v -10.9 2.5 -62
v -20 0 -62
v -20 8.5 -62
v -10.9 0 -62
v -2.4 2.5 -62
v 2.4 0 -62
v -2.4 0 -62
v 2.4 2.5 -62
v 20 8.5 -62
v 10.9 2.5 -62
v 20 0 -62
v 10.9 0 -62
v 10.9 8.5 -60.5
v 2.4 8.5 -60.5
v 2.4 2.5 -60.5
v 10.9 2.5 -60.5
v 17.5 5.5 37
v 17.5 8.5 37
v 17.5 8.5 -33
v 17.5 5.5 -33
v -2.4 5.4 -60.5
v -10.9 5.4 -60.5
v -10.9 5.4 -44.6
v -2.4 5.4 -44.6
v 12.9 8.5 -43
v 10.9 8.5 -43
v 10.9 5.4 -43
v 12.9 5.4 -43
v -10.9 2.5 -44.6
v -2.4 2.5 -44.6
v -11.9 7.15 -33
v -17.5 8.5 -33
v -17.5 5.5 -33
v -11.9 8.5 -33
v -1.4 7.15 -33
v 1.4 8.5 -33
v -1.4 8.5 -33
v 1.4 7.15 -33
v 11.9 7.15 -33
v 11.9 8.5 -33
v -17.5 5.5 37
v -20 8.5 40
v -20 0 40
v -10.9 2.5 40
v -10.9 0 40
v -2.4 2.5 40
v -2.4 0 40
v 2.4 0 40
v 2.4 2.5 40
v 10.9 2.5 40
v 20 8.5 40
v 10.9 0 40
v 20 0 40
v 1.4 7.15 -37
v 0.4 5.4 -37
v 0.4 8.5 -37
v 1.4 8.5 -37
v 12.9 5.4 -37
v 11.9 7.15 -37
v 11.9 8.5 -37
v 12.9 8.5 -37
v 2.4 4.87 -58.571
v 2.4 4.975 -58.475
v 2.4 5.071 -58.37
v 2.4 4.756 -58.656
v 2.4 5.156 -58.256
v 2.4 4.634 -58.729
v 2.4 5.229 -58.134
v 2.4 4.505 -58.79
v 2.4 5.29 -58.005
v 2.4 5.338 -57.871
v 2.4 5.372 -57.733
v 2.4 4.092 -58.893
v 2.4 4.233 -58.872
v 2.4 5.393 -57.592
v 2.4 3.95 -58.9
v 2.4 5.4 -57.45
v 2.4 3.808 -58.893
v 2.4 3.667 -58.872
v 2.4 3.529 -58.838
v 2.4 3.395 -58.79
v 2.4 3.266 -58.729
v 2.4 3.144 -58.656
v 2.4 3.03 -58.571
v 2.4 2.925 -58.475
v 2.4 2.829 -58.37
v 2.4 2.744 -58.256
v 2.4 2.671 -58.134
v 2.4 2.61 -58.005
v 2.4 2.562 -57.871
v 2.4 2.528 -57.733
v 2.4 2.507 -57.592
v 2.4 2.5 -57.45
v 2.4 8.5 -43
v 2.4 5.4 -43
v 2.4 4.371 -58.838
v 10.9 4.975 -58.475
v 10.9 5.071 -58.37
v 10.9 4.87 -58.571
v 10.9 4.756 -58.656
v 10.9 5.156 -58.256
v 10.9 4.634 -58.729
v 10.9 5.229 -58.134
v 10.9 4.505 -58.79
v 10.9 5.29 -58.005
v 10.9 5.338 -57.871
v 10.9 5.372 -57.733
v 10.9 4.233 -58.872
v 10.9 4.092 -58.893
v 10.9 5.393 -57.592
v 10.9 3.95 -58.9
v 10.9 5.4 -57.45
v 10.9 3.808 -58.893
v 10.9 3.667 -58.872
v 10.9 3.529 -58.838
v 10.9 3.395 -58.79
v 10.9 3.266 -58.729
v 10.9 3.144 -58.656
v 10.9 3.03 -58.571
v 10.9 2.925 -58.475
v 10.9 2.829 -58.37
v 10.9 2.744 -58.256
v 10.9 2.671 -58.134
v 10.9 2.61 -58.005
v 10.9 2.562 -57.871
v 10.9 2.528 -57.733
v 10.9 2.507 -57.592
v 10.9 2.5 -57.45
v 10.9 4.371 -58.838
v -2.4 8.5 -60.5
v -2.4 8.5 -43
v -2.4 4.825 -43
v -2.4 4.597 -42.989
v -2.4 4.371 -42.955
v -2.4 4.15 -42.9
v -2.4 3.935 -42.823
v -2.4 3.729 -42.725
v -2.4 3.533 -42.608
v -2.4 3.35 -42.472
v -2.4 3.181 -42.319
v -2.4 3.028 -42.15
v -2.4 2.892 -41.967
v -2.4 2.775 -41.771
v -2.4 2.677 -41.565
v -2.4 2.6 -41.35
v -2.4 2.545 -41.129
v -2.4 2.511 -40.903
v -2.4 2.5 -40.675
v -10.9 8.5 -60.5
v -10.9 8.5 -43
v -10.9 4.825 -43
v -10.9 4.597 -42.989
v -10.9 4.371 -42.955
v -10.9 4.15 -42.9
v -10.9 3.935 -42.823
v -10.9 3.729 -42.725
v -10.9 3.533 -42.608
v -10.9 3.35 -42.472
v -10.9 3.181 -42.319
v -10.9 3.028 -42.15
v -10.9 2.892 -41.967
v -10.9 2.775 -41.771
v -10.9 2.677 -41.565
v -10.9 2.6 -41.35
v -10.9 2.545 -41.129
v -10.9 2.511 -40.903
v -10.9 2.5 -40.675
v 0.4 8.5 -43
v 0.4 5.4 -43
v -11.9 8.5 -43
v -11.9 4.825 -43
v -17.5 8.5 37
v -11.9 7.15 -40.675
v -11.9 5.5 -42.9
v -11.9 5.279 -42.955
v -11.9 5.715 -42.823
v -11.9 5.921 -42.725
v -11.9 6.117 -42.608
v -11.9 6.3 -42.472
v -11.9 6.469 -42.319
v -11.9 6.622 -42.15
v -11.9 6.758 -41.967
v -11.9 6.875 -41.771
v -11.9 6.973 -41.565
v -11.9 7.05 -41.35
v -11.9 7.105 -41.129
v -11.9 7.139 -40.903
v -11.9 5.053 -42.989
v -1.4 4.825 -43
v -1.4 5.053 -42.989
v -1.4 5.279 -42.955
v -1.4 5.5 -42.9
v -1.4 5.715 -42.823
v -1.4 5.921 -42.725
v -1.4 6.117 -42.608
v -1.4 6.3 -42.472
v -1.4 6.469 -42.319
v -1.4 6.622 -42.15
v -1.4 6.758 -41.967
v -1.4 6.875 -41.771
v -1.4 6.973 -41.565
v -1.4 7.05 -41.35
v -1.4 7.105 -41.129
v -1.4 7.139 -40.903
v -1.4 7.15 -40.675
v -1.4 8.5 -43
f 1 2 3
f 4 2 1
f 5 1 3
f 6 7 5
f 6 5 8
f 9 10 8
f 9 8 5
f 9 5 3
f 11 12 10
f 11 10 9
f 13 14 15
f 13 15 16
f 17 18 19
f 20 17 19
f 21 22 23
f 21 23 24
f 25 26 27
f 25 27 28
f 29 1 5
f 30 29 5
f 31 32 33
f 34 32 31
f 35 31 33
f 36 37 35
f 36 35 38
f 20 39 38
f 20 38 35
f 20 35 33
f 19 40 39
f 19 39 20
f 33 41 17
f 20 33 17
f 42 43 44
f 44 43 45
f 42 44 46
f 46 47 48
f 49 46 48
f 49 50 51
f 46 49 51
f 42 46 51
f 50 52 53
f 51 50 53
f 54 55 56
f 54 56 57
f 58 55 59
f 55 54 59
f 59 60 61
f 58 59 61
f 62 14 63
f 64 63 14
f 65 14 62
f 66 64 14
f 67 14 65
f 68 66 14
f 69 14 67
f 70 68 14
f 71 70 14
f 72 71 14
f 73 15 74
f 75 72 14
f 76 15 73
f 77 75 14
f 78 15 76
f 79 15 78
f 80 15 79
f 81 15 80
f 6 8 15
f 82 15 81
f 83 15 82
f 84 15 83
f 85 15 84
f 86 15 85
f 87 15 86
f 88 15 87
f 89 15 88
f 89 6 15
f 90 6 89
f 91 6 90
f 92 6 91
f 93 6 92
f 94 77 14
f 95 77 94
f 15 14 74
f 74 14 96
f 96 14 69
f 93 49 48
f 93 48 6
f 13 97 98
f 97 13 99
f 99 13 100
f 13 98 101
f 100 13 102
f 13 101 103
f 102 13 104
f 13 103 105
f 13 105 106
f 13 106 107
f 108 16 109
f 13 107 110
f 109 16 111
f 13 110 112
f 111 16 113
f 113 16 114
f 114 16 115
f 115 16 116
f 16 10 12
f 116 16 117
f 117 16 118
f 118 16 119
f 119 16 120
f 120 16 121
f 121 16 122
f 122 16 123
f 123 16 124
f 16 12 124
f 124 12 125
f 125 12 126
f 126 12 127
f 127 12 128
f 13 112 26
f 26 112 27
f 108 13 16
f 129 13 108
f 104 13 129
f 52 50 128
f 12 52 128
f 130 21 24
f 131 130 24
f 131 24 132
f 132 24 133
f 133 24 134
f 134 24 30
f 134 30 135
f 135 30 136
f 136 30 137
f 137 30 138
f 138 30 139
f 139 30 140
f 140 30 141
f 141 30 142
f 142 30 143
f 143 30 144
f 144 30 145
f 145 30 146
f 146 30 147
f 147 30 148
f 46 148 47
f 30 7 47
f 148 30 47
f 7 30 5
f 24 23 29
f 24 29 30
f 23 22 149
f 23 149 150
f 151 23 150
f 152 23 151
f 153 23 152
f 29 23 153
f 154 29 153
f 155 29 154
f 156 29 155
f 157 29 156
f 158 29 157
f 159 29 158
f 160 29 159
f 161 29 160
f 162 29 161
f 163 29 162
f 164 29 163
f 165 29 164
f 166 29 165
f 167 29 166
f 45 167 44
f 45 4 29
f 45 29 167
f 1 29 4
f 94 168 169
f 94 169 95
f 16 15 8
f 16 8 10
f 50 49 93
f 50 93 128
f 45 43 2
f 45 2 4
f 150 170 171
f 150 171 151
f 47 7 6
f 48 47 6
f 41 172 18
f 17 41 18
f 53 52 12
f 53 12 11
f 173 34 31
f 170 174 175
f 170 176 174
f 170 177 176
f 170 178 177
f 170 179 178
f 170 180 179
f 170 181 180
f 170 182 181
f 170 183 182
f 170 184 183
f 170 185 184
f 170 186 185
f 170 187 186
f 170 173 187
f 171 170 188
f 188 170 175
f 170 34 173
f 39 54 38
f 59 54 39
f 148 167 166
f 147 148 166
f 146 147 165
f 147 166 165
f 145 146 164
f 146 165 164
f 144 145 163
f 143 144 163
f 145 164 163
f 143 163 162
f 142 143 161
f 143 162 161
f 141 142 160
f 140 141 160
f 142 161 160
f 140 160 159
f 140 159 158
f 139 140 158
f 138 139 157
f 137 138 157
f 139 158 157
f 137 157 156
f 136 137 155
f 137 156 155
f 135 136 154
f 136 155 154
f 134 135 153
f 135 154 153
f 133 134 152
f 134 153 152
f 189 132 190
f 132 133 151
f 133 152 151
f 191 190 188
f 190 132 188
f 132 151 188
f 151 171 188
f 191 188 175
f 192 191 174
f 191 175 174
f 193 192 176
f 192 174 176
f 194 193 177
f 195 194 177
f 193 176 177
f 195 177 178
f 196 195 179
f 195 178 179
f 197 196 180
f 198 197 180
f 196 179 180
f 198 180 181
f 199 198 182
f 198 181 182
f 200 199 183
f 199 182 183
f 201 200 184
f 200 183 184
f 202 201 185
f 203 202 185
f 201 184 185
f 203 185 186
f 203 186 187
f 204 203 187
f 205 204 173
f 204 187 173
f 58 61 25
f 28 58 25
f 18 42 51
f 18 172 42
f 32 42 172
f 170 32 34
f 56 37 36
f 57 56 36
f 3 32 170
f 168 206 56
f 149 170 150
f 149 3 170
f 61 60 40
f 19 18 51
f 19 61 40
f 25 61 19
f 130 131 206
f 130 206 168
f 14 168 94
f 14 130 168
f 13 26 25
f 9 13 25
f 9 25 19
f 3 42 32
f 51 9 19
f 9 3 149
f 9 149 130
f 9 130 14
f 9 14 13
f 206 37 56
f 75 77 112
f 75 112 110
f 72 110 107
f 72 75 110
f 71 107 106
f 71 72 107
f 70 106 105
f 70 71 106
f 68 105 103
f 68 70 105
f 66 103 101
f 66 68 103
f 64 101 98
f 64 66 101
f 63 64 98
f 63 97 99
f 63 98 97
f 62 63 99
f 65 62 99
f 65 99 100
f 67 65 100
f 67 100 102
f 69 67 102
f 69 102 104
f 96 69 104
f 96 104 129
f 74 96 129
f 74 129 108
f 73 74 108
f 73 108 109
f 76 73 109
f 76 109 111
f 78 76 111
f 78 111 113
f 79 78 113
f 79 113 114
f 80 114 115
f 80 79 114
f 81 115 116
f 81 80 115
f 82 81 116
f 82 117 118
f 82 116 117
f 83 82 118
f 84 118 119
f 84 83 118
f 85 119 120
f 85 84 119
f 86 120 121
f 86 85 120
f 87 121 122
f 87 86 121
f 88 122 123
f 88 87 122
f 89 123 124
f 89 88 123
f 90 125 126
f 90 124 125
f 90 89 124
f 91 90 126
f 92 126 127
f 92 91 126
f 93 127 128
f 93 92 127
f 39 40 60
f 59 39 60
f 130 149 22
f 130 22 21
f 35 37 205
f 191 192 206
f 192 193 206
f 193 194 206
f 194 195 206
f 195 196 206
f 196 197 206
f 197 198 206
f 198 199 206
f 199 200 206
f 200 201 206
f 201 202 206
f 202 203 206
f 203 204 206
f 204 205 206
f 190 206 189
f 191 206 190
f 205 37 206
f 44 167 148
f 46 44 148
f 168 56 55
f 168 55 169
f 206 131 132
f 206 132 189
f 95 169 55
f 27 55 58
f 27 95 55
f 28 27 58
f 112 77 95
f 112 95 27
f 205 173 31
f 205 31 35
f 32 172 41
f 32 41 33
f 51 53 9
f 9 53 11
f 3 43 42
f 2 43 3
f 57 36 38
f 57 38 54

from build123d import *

# Parameters (mm, degrees)
SKETCH1_W               = 40
SKETCH1_H               = 102
BOSS_EXTRUDE1_DEPTH     = 8.5
SKETCH2_W               = 35
SKETCH2_H               = 70
CUT_EXTRUDE1_DEPTH      = 3
SKETCH3_W               = 10.5
SKETCH3_H               = 10
CUT_EXTRUDE2_DEPTH      = 1.35
SKETCH4_W               = 12.5
SKETCH4_H               = 6
CUT_EXTRUDE3_DEPTH      = 3.1
SKETCH5_W               = 8.5
SKETCH5_H               = 17.5
PCB_PLACE_DEPTH         = 3.1
SKETCH6_W               = 8.5
SKETCH6_H               = 1.6
NICKEL_STRIP_HOLE_DEPTH = 66.369411807
CUT_EXTRUDE4_REACH      = 67.698
SKETCH7_W               = 8.5
SKETCH7_H               = 17.5
SKETCH8_W               = 8.5
SKETCH8_H               = 1.6
CUT_EXTRUDE5_DEPTH      = 10
SKETCH9_W               = 8.5
SKETCH9_H               = 102
NICKEL_STRIP_RAIL_DEPTH = 2.5
FILLET3_R               = 2.325
FILLET4_RADIUS          = 1.45
FILLET4_LENGTH          = 8.5


with BuildPart() as part:
    # Sketch1 → Boss-Extrude1 (new body)
    with BuildSketch(Plane(origin=(0, 0, 0), x_dir=(1, 0, 0), z_dir=(0, 1, 0))):
        with Locations((0, 11)):
            Rectangle(SKETCH1_W, SKETCH1_H)
    extrude(amount=BOSS_EXTRUDE1_DEPTH)

    # Sketch2 → Cut-Extrude1 (cut)
    with BuildSketch(Plane(origin=(0, 8.5, 0), x_dir=(1, 0, 0), z_dir=(0, 1, 0))):
        with Locations((0, -2)):
            Rectangle(SKETCH2_W, SKETCH2_H)
    extrude(amount=-CUT_EXTRUDE1_DEPTH, mode=Mode.SUBTRACT)

    # Sketch3 → Cut-Extrude2 (cut)
    with BuildSketch(Plane(origin=(0, 8.5, 0), x_dir=(1, 0, 0), z_dir=(0, 1, 0))):
        with Locations((-6.65, 38)):
            Rectangle(SKETCH3_W, SKETCH3_H)
        with Locations((6.65, 38)):
            Rectangle(SKETCH3_W, SKETCH3_H)
    extrude(amount=-CUT_EXTRUDE2_DEPTH, mode=Mode.SUBTRACT)

    # Sketch4 → Cut-Extrude3 (cut)
    with BuildSketch(Plane(origin=(0, 8.5, 0), x_dir=(1, 0, 0), z_dir=(0, 1, 0))):
        with Locations((6.65, 40)):
            Rectangle(SKETCH4_W, SKETCH4_H)
    extrude(amount=-CUT_EXTRUDE3_DEPTH, mode=Mode.SUBTRACT)

    # Sketch5 → PCB place (cut)
    with BuildSketch(Plane(origin=(0, 8.5, 0), x_dir=(1, 0, 0), z_dir=(0, 1, 0))):
        with Locations((6.65, 51.75)):
            Rectangle(SKETCH5_W, SKETCH5_H)
    extrude(amount=-PCB_PLACE_DEPTH, mode=Mode.SUBTRACT)

    # Sketch6 → Nickel strip hole (cut, through all)
    with BuildSketch(Plane(origin=(0, 5.4, 0), x_dir=(1, 0, 0), z_dir=(0, 1, 0))):
        with Locations((6.65, 59.7)):
            Rectangle(SKETCH6_W, SKETCH6_H)
    extrude(amount=-NICKEL_STRIP_HOLE_DEPTH, mode=Mode.SUBTRACT)

    # Cut-Extrude4: up to this face of the body (flat: up to its plane)
    cut_extrude4_end = Plane(part.part.faces().sort_by_distance((6.65, 5.4, -47.042077088))[0])
    # Sketch7 → Cut-Extrude4 (cut, up to the picked face)
    with BuildSketch(Plane(origin=(0, 8.5, 0), x_dir=(1, 0, 0), z_dir=(0, 1, 0)), mode=Mode.PRIVATE) as cut_extrude4_sk1:
        with Locations((-6.65, 51.75)):
            Rectangle(SKETCH7_W, SKETCH7_H)
    cut_extrude4_tool1 = split(extrude(cut_extrude4_sk1.sketch, amount=-CUT_EXTRUDE4_REACH, mode=Mode.PRIVATE), bisect_by=cut_extrude4_end, keep=Keep.BOTH, mode=Mode.PRIVATE)
    add(cut_extrude4_tool1.solids().sort_by(Axis((-6.65, 8.5, -51.75), (0, -1, 0)))[0], mode=Mode.SUBTRACT)

    # Sketch8 → Cut-Extrude5 (cut)
    with BuildSketch(Plane(origin=(0, 5.4, 0), x_dir=(1, 0, 0), z_dir=(0, 1, 0))):
        with Locations((-6.65, 43.8)):
            Rectangle(SKETCH8_W, SKETCH8_H)
    extrude(amount=-CUT_EXTRUDE5_DEPTH, mode=Mode.SUBTRACT)

    # Sketch9 → Nickel strip rail (cut)
    with BuildSketch(Plane.XZ):
        with Locations((-6.65, -11)):
            Rectangle(SKETCH9_W, SKETCH9_H)
        with Locations((6.65, -11)):
            Rectangle(SKETCH9_W, SKETCH9_H)
    extrude(amount=-NICKEL_STRIP_RAIL_DEPTH, mode=Mode.SUBTRACT)

    # Fillet3
    # the kernel refuses this fillet: 2.325 mm, written as the material it takes off along each edge
    with BuildSketch(Plane(origin=(3.4125, 7.15, -43), x_dir=(0, 0, 1), z_dir=(-1, 0, 0))) as fillet3_piece_1_section:
        with BuildLine():
            CenterArc((FILLET3_R, -FILLET3_R), FILLET3_R, 90, 90)
            Line((0, -FILLET3_R), (0, 0))
            Line((0, 0), (FILLET3_R, 0))
        make_face()
    fillet3_piece_1 = extrude(amount=20.125, mode=Mode.PRIVATE)
    fillet3_piece_1 = split(fillet3_piece_1, bisect_by=Plane(origin=(-11.9, 6.647157341, -42.474696814), z_dir=(1, 0, 0)), keep=Keep.TOP, mode=Mode.PRIVATE)
    fillet3_piece_1 = split(fillet3_piece_1, bisect_by=Plane(origin=(-1.4, 6.647157341, -42.474696814), z_dir=(-1, 0, 0)), keep=Keep.TOP, mode=Mode.PRIVATE)
    add(fillet3_piece_1, mode=Mode.SUBTRACT)
    with BuildSketch(Plane(origin=(-10.9, 2.5, -43), x_dir=(0, 1, 0), z_dir=(1, 0, 0))) as fillet3_piece_2:
        with BuildLine():
            CenterArc((FILLET3_R, FILLET3_R), FILLET3_R, 180, 90)
            Line((0, FILLET3_R), (0, 0))
            Line((0, 0), (FILLET3_R, 0))
        make_face()
    extrude(amount=8.5, mode=Mode.SUBTRACT)

    # Fillet4: full round fillet: the end face becomes a half cylinder, R = half its width
    fillet4_face = Plane((6.65, 3.95, -58.9), x_dir=(-1, 0, 0), z_dir=(0, 0, -1))  # on the end face: x along it, z out of the body
    fillet4_slab = fillet4_face.offset(-FILLET4_RADIUS / 2) * Box(FILLET4_LENGTH, 2 * FILLET4_RADIUS, FILLET4_RADIUS, mode=Mode.PRIVATE)  # the body's end, R deep
    fillet4_round = Plane((6.65, 3.95, -57.45), x_dir=(0, 0, -1), z_dir=(-1, 0, 0)) * Cylinder(FILLET4_RADIUS, FILLET4_LENGTH, mode=Mode.PRIVATE)  # its axis R under the face
    add(fillet4_slab - fillet4_round, mode=Mode.SUBTRACT)


solid = part.part
